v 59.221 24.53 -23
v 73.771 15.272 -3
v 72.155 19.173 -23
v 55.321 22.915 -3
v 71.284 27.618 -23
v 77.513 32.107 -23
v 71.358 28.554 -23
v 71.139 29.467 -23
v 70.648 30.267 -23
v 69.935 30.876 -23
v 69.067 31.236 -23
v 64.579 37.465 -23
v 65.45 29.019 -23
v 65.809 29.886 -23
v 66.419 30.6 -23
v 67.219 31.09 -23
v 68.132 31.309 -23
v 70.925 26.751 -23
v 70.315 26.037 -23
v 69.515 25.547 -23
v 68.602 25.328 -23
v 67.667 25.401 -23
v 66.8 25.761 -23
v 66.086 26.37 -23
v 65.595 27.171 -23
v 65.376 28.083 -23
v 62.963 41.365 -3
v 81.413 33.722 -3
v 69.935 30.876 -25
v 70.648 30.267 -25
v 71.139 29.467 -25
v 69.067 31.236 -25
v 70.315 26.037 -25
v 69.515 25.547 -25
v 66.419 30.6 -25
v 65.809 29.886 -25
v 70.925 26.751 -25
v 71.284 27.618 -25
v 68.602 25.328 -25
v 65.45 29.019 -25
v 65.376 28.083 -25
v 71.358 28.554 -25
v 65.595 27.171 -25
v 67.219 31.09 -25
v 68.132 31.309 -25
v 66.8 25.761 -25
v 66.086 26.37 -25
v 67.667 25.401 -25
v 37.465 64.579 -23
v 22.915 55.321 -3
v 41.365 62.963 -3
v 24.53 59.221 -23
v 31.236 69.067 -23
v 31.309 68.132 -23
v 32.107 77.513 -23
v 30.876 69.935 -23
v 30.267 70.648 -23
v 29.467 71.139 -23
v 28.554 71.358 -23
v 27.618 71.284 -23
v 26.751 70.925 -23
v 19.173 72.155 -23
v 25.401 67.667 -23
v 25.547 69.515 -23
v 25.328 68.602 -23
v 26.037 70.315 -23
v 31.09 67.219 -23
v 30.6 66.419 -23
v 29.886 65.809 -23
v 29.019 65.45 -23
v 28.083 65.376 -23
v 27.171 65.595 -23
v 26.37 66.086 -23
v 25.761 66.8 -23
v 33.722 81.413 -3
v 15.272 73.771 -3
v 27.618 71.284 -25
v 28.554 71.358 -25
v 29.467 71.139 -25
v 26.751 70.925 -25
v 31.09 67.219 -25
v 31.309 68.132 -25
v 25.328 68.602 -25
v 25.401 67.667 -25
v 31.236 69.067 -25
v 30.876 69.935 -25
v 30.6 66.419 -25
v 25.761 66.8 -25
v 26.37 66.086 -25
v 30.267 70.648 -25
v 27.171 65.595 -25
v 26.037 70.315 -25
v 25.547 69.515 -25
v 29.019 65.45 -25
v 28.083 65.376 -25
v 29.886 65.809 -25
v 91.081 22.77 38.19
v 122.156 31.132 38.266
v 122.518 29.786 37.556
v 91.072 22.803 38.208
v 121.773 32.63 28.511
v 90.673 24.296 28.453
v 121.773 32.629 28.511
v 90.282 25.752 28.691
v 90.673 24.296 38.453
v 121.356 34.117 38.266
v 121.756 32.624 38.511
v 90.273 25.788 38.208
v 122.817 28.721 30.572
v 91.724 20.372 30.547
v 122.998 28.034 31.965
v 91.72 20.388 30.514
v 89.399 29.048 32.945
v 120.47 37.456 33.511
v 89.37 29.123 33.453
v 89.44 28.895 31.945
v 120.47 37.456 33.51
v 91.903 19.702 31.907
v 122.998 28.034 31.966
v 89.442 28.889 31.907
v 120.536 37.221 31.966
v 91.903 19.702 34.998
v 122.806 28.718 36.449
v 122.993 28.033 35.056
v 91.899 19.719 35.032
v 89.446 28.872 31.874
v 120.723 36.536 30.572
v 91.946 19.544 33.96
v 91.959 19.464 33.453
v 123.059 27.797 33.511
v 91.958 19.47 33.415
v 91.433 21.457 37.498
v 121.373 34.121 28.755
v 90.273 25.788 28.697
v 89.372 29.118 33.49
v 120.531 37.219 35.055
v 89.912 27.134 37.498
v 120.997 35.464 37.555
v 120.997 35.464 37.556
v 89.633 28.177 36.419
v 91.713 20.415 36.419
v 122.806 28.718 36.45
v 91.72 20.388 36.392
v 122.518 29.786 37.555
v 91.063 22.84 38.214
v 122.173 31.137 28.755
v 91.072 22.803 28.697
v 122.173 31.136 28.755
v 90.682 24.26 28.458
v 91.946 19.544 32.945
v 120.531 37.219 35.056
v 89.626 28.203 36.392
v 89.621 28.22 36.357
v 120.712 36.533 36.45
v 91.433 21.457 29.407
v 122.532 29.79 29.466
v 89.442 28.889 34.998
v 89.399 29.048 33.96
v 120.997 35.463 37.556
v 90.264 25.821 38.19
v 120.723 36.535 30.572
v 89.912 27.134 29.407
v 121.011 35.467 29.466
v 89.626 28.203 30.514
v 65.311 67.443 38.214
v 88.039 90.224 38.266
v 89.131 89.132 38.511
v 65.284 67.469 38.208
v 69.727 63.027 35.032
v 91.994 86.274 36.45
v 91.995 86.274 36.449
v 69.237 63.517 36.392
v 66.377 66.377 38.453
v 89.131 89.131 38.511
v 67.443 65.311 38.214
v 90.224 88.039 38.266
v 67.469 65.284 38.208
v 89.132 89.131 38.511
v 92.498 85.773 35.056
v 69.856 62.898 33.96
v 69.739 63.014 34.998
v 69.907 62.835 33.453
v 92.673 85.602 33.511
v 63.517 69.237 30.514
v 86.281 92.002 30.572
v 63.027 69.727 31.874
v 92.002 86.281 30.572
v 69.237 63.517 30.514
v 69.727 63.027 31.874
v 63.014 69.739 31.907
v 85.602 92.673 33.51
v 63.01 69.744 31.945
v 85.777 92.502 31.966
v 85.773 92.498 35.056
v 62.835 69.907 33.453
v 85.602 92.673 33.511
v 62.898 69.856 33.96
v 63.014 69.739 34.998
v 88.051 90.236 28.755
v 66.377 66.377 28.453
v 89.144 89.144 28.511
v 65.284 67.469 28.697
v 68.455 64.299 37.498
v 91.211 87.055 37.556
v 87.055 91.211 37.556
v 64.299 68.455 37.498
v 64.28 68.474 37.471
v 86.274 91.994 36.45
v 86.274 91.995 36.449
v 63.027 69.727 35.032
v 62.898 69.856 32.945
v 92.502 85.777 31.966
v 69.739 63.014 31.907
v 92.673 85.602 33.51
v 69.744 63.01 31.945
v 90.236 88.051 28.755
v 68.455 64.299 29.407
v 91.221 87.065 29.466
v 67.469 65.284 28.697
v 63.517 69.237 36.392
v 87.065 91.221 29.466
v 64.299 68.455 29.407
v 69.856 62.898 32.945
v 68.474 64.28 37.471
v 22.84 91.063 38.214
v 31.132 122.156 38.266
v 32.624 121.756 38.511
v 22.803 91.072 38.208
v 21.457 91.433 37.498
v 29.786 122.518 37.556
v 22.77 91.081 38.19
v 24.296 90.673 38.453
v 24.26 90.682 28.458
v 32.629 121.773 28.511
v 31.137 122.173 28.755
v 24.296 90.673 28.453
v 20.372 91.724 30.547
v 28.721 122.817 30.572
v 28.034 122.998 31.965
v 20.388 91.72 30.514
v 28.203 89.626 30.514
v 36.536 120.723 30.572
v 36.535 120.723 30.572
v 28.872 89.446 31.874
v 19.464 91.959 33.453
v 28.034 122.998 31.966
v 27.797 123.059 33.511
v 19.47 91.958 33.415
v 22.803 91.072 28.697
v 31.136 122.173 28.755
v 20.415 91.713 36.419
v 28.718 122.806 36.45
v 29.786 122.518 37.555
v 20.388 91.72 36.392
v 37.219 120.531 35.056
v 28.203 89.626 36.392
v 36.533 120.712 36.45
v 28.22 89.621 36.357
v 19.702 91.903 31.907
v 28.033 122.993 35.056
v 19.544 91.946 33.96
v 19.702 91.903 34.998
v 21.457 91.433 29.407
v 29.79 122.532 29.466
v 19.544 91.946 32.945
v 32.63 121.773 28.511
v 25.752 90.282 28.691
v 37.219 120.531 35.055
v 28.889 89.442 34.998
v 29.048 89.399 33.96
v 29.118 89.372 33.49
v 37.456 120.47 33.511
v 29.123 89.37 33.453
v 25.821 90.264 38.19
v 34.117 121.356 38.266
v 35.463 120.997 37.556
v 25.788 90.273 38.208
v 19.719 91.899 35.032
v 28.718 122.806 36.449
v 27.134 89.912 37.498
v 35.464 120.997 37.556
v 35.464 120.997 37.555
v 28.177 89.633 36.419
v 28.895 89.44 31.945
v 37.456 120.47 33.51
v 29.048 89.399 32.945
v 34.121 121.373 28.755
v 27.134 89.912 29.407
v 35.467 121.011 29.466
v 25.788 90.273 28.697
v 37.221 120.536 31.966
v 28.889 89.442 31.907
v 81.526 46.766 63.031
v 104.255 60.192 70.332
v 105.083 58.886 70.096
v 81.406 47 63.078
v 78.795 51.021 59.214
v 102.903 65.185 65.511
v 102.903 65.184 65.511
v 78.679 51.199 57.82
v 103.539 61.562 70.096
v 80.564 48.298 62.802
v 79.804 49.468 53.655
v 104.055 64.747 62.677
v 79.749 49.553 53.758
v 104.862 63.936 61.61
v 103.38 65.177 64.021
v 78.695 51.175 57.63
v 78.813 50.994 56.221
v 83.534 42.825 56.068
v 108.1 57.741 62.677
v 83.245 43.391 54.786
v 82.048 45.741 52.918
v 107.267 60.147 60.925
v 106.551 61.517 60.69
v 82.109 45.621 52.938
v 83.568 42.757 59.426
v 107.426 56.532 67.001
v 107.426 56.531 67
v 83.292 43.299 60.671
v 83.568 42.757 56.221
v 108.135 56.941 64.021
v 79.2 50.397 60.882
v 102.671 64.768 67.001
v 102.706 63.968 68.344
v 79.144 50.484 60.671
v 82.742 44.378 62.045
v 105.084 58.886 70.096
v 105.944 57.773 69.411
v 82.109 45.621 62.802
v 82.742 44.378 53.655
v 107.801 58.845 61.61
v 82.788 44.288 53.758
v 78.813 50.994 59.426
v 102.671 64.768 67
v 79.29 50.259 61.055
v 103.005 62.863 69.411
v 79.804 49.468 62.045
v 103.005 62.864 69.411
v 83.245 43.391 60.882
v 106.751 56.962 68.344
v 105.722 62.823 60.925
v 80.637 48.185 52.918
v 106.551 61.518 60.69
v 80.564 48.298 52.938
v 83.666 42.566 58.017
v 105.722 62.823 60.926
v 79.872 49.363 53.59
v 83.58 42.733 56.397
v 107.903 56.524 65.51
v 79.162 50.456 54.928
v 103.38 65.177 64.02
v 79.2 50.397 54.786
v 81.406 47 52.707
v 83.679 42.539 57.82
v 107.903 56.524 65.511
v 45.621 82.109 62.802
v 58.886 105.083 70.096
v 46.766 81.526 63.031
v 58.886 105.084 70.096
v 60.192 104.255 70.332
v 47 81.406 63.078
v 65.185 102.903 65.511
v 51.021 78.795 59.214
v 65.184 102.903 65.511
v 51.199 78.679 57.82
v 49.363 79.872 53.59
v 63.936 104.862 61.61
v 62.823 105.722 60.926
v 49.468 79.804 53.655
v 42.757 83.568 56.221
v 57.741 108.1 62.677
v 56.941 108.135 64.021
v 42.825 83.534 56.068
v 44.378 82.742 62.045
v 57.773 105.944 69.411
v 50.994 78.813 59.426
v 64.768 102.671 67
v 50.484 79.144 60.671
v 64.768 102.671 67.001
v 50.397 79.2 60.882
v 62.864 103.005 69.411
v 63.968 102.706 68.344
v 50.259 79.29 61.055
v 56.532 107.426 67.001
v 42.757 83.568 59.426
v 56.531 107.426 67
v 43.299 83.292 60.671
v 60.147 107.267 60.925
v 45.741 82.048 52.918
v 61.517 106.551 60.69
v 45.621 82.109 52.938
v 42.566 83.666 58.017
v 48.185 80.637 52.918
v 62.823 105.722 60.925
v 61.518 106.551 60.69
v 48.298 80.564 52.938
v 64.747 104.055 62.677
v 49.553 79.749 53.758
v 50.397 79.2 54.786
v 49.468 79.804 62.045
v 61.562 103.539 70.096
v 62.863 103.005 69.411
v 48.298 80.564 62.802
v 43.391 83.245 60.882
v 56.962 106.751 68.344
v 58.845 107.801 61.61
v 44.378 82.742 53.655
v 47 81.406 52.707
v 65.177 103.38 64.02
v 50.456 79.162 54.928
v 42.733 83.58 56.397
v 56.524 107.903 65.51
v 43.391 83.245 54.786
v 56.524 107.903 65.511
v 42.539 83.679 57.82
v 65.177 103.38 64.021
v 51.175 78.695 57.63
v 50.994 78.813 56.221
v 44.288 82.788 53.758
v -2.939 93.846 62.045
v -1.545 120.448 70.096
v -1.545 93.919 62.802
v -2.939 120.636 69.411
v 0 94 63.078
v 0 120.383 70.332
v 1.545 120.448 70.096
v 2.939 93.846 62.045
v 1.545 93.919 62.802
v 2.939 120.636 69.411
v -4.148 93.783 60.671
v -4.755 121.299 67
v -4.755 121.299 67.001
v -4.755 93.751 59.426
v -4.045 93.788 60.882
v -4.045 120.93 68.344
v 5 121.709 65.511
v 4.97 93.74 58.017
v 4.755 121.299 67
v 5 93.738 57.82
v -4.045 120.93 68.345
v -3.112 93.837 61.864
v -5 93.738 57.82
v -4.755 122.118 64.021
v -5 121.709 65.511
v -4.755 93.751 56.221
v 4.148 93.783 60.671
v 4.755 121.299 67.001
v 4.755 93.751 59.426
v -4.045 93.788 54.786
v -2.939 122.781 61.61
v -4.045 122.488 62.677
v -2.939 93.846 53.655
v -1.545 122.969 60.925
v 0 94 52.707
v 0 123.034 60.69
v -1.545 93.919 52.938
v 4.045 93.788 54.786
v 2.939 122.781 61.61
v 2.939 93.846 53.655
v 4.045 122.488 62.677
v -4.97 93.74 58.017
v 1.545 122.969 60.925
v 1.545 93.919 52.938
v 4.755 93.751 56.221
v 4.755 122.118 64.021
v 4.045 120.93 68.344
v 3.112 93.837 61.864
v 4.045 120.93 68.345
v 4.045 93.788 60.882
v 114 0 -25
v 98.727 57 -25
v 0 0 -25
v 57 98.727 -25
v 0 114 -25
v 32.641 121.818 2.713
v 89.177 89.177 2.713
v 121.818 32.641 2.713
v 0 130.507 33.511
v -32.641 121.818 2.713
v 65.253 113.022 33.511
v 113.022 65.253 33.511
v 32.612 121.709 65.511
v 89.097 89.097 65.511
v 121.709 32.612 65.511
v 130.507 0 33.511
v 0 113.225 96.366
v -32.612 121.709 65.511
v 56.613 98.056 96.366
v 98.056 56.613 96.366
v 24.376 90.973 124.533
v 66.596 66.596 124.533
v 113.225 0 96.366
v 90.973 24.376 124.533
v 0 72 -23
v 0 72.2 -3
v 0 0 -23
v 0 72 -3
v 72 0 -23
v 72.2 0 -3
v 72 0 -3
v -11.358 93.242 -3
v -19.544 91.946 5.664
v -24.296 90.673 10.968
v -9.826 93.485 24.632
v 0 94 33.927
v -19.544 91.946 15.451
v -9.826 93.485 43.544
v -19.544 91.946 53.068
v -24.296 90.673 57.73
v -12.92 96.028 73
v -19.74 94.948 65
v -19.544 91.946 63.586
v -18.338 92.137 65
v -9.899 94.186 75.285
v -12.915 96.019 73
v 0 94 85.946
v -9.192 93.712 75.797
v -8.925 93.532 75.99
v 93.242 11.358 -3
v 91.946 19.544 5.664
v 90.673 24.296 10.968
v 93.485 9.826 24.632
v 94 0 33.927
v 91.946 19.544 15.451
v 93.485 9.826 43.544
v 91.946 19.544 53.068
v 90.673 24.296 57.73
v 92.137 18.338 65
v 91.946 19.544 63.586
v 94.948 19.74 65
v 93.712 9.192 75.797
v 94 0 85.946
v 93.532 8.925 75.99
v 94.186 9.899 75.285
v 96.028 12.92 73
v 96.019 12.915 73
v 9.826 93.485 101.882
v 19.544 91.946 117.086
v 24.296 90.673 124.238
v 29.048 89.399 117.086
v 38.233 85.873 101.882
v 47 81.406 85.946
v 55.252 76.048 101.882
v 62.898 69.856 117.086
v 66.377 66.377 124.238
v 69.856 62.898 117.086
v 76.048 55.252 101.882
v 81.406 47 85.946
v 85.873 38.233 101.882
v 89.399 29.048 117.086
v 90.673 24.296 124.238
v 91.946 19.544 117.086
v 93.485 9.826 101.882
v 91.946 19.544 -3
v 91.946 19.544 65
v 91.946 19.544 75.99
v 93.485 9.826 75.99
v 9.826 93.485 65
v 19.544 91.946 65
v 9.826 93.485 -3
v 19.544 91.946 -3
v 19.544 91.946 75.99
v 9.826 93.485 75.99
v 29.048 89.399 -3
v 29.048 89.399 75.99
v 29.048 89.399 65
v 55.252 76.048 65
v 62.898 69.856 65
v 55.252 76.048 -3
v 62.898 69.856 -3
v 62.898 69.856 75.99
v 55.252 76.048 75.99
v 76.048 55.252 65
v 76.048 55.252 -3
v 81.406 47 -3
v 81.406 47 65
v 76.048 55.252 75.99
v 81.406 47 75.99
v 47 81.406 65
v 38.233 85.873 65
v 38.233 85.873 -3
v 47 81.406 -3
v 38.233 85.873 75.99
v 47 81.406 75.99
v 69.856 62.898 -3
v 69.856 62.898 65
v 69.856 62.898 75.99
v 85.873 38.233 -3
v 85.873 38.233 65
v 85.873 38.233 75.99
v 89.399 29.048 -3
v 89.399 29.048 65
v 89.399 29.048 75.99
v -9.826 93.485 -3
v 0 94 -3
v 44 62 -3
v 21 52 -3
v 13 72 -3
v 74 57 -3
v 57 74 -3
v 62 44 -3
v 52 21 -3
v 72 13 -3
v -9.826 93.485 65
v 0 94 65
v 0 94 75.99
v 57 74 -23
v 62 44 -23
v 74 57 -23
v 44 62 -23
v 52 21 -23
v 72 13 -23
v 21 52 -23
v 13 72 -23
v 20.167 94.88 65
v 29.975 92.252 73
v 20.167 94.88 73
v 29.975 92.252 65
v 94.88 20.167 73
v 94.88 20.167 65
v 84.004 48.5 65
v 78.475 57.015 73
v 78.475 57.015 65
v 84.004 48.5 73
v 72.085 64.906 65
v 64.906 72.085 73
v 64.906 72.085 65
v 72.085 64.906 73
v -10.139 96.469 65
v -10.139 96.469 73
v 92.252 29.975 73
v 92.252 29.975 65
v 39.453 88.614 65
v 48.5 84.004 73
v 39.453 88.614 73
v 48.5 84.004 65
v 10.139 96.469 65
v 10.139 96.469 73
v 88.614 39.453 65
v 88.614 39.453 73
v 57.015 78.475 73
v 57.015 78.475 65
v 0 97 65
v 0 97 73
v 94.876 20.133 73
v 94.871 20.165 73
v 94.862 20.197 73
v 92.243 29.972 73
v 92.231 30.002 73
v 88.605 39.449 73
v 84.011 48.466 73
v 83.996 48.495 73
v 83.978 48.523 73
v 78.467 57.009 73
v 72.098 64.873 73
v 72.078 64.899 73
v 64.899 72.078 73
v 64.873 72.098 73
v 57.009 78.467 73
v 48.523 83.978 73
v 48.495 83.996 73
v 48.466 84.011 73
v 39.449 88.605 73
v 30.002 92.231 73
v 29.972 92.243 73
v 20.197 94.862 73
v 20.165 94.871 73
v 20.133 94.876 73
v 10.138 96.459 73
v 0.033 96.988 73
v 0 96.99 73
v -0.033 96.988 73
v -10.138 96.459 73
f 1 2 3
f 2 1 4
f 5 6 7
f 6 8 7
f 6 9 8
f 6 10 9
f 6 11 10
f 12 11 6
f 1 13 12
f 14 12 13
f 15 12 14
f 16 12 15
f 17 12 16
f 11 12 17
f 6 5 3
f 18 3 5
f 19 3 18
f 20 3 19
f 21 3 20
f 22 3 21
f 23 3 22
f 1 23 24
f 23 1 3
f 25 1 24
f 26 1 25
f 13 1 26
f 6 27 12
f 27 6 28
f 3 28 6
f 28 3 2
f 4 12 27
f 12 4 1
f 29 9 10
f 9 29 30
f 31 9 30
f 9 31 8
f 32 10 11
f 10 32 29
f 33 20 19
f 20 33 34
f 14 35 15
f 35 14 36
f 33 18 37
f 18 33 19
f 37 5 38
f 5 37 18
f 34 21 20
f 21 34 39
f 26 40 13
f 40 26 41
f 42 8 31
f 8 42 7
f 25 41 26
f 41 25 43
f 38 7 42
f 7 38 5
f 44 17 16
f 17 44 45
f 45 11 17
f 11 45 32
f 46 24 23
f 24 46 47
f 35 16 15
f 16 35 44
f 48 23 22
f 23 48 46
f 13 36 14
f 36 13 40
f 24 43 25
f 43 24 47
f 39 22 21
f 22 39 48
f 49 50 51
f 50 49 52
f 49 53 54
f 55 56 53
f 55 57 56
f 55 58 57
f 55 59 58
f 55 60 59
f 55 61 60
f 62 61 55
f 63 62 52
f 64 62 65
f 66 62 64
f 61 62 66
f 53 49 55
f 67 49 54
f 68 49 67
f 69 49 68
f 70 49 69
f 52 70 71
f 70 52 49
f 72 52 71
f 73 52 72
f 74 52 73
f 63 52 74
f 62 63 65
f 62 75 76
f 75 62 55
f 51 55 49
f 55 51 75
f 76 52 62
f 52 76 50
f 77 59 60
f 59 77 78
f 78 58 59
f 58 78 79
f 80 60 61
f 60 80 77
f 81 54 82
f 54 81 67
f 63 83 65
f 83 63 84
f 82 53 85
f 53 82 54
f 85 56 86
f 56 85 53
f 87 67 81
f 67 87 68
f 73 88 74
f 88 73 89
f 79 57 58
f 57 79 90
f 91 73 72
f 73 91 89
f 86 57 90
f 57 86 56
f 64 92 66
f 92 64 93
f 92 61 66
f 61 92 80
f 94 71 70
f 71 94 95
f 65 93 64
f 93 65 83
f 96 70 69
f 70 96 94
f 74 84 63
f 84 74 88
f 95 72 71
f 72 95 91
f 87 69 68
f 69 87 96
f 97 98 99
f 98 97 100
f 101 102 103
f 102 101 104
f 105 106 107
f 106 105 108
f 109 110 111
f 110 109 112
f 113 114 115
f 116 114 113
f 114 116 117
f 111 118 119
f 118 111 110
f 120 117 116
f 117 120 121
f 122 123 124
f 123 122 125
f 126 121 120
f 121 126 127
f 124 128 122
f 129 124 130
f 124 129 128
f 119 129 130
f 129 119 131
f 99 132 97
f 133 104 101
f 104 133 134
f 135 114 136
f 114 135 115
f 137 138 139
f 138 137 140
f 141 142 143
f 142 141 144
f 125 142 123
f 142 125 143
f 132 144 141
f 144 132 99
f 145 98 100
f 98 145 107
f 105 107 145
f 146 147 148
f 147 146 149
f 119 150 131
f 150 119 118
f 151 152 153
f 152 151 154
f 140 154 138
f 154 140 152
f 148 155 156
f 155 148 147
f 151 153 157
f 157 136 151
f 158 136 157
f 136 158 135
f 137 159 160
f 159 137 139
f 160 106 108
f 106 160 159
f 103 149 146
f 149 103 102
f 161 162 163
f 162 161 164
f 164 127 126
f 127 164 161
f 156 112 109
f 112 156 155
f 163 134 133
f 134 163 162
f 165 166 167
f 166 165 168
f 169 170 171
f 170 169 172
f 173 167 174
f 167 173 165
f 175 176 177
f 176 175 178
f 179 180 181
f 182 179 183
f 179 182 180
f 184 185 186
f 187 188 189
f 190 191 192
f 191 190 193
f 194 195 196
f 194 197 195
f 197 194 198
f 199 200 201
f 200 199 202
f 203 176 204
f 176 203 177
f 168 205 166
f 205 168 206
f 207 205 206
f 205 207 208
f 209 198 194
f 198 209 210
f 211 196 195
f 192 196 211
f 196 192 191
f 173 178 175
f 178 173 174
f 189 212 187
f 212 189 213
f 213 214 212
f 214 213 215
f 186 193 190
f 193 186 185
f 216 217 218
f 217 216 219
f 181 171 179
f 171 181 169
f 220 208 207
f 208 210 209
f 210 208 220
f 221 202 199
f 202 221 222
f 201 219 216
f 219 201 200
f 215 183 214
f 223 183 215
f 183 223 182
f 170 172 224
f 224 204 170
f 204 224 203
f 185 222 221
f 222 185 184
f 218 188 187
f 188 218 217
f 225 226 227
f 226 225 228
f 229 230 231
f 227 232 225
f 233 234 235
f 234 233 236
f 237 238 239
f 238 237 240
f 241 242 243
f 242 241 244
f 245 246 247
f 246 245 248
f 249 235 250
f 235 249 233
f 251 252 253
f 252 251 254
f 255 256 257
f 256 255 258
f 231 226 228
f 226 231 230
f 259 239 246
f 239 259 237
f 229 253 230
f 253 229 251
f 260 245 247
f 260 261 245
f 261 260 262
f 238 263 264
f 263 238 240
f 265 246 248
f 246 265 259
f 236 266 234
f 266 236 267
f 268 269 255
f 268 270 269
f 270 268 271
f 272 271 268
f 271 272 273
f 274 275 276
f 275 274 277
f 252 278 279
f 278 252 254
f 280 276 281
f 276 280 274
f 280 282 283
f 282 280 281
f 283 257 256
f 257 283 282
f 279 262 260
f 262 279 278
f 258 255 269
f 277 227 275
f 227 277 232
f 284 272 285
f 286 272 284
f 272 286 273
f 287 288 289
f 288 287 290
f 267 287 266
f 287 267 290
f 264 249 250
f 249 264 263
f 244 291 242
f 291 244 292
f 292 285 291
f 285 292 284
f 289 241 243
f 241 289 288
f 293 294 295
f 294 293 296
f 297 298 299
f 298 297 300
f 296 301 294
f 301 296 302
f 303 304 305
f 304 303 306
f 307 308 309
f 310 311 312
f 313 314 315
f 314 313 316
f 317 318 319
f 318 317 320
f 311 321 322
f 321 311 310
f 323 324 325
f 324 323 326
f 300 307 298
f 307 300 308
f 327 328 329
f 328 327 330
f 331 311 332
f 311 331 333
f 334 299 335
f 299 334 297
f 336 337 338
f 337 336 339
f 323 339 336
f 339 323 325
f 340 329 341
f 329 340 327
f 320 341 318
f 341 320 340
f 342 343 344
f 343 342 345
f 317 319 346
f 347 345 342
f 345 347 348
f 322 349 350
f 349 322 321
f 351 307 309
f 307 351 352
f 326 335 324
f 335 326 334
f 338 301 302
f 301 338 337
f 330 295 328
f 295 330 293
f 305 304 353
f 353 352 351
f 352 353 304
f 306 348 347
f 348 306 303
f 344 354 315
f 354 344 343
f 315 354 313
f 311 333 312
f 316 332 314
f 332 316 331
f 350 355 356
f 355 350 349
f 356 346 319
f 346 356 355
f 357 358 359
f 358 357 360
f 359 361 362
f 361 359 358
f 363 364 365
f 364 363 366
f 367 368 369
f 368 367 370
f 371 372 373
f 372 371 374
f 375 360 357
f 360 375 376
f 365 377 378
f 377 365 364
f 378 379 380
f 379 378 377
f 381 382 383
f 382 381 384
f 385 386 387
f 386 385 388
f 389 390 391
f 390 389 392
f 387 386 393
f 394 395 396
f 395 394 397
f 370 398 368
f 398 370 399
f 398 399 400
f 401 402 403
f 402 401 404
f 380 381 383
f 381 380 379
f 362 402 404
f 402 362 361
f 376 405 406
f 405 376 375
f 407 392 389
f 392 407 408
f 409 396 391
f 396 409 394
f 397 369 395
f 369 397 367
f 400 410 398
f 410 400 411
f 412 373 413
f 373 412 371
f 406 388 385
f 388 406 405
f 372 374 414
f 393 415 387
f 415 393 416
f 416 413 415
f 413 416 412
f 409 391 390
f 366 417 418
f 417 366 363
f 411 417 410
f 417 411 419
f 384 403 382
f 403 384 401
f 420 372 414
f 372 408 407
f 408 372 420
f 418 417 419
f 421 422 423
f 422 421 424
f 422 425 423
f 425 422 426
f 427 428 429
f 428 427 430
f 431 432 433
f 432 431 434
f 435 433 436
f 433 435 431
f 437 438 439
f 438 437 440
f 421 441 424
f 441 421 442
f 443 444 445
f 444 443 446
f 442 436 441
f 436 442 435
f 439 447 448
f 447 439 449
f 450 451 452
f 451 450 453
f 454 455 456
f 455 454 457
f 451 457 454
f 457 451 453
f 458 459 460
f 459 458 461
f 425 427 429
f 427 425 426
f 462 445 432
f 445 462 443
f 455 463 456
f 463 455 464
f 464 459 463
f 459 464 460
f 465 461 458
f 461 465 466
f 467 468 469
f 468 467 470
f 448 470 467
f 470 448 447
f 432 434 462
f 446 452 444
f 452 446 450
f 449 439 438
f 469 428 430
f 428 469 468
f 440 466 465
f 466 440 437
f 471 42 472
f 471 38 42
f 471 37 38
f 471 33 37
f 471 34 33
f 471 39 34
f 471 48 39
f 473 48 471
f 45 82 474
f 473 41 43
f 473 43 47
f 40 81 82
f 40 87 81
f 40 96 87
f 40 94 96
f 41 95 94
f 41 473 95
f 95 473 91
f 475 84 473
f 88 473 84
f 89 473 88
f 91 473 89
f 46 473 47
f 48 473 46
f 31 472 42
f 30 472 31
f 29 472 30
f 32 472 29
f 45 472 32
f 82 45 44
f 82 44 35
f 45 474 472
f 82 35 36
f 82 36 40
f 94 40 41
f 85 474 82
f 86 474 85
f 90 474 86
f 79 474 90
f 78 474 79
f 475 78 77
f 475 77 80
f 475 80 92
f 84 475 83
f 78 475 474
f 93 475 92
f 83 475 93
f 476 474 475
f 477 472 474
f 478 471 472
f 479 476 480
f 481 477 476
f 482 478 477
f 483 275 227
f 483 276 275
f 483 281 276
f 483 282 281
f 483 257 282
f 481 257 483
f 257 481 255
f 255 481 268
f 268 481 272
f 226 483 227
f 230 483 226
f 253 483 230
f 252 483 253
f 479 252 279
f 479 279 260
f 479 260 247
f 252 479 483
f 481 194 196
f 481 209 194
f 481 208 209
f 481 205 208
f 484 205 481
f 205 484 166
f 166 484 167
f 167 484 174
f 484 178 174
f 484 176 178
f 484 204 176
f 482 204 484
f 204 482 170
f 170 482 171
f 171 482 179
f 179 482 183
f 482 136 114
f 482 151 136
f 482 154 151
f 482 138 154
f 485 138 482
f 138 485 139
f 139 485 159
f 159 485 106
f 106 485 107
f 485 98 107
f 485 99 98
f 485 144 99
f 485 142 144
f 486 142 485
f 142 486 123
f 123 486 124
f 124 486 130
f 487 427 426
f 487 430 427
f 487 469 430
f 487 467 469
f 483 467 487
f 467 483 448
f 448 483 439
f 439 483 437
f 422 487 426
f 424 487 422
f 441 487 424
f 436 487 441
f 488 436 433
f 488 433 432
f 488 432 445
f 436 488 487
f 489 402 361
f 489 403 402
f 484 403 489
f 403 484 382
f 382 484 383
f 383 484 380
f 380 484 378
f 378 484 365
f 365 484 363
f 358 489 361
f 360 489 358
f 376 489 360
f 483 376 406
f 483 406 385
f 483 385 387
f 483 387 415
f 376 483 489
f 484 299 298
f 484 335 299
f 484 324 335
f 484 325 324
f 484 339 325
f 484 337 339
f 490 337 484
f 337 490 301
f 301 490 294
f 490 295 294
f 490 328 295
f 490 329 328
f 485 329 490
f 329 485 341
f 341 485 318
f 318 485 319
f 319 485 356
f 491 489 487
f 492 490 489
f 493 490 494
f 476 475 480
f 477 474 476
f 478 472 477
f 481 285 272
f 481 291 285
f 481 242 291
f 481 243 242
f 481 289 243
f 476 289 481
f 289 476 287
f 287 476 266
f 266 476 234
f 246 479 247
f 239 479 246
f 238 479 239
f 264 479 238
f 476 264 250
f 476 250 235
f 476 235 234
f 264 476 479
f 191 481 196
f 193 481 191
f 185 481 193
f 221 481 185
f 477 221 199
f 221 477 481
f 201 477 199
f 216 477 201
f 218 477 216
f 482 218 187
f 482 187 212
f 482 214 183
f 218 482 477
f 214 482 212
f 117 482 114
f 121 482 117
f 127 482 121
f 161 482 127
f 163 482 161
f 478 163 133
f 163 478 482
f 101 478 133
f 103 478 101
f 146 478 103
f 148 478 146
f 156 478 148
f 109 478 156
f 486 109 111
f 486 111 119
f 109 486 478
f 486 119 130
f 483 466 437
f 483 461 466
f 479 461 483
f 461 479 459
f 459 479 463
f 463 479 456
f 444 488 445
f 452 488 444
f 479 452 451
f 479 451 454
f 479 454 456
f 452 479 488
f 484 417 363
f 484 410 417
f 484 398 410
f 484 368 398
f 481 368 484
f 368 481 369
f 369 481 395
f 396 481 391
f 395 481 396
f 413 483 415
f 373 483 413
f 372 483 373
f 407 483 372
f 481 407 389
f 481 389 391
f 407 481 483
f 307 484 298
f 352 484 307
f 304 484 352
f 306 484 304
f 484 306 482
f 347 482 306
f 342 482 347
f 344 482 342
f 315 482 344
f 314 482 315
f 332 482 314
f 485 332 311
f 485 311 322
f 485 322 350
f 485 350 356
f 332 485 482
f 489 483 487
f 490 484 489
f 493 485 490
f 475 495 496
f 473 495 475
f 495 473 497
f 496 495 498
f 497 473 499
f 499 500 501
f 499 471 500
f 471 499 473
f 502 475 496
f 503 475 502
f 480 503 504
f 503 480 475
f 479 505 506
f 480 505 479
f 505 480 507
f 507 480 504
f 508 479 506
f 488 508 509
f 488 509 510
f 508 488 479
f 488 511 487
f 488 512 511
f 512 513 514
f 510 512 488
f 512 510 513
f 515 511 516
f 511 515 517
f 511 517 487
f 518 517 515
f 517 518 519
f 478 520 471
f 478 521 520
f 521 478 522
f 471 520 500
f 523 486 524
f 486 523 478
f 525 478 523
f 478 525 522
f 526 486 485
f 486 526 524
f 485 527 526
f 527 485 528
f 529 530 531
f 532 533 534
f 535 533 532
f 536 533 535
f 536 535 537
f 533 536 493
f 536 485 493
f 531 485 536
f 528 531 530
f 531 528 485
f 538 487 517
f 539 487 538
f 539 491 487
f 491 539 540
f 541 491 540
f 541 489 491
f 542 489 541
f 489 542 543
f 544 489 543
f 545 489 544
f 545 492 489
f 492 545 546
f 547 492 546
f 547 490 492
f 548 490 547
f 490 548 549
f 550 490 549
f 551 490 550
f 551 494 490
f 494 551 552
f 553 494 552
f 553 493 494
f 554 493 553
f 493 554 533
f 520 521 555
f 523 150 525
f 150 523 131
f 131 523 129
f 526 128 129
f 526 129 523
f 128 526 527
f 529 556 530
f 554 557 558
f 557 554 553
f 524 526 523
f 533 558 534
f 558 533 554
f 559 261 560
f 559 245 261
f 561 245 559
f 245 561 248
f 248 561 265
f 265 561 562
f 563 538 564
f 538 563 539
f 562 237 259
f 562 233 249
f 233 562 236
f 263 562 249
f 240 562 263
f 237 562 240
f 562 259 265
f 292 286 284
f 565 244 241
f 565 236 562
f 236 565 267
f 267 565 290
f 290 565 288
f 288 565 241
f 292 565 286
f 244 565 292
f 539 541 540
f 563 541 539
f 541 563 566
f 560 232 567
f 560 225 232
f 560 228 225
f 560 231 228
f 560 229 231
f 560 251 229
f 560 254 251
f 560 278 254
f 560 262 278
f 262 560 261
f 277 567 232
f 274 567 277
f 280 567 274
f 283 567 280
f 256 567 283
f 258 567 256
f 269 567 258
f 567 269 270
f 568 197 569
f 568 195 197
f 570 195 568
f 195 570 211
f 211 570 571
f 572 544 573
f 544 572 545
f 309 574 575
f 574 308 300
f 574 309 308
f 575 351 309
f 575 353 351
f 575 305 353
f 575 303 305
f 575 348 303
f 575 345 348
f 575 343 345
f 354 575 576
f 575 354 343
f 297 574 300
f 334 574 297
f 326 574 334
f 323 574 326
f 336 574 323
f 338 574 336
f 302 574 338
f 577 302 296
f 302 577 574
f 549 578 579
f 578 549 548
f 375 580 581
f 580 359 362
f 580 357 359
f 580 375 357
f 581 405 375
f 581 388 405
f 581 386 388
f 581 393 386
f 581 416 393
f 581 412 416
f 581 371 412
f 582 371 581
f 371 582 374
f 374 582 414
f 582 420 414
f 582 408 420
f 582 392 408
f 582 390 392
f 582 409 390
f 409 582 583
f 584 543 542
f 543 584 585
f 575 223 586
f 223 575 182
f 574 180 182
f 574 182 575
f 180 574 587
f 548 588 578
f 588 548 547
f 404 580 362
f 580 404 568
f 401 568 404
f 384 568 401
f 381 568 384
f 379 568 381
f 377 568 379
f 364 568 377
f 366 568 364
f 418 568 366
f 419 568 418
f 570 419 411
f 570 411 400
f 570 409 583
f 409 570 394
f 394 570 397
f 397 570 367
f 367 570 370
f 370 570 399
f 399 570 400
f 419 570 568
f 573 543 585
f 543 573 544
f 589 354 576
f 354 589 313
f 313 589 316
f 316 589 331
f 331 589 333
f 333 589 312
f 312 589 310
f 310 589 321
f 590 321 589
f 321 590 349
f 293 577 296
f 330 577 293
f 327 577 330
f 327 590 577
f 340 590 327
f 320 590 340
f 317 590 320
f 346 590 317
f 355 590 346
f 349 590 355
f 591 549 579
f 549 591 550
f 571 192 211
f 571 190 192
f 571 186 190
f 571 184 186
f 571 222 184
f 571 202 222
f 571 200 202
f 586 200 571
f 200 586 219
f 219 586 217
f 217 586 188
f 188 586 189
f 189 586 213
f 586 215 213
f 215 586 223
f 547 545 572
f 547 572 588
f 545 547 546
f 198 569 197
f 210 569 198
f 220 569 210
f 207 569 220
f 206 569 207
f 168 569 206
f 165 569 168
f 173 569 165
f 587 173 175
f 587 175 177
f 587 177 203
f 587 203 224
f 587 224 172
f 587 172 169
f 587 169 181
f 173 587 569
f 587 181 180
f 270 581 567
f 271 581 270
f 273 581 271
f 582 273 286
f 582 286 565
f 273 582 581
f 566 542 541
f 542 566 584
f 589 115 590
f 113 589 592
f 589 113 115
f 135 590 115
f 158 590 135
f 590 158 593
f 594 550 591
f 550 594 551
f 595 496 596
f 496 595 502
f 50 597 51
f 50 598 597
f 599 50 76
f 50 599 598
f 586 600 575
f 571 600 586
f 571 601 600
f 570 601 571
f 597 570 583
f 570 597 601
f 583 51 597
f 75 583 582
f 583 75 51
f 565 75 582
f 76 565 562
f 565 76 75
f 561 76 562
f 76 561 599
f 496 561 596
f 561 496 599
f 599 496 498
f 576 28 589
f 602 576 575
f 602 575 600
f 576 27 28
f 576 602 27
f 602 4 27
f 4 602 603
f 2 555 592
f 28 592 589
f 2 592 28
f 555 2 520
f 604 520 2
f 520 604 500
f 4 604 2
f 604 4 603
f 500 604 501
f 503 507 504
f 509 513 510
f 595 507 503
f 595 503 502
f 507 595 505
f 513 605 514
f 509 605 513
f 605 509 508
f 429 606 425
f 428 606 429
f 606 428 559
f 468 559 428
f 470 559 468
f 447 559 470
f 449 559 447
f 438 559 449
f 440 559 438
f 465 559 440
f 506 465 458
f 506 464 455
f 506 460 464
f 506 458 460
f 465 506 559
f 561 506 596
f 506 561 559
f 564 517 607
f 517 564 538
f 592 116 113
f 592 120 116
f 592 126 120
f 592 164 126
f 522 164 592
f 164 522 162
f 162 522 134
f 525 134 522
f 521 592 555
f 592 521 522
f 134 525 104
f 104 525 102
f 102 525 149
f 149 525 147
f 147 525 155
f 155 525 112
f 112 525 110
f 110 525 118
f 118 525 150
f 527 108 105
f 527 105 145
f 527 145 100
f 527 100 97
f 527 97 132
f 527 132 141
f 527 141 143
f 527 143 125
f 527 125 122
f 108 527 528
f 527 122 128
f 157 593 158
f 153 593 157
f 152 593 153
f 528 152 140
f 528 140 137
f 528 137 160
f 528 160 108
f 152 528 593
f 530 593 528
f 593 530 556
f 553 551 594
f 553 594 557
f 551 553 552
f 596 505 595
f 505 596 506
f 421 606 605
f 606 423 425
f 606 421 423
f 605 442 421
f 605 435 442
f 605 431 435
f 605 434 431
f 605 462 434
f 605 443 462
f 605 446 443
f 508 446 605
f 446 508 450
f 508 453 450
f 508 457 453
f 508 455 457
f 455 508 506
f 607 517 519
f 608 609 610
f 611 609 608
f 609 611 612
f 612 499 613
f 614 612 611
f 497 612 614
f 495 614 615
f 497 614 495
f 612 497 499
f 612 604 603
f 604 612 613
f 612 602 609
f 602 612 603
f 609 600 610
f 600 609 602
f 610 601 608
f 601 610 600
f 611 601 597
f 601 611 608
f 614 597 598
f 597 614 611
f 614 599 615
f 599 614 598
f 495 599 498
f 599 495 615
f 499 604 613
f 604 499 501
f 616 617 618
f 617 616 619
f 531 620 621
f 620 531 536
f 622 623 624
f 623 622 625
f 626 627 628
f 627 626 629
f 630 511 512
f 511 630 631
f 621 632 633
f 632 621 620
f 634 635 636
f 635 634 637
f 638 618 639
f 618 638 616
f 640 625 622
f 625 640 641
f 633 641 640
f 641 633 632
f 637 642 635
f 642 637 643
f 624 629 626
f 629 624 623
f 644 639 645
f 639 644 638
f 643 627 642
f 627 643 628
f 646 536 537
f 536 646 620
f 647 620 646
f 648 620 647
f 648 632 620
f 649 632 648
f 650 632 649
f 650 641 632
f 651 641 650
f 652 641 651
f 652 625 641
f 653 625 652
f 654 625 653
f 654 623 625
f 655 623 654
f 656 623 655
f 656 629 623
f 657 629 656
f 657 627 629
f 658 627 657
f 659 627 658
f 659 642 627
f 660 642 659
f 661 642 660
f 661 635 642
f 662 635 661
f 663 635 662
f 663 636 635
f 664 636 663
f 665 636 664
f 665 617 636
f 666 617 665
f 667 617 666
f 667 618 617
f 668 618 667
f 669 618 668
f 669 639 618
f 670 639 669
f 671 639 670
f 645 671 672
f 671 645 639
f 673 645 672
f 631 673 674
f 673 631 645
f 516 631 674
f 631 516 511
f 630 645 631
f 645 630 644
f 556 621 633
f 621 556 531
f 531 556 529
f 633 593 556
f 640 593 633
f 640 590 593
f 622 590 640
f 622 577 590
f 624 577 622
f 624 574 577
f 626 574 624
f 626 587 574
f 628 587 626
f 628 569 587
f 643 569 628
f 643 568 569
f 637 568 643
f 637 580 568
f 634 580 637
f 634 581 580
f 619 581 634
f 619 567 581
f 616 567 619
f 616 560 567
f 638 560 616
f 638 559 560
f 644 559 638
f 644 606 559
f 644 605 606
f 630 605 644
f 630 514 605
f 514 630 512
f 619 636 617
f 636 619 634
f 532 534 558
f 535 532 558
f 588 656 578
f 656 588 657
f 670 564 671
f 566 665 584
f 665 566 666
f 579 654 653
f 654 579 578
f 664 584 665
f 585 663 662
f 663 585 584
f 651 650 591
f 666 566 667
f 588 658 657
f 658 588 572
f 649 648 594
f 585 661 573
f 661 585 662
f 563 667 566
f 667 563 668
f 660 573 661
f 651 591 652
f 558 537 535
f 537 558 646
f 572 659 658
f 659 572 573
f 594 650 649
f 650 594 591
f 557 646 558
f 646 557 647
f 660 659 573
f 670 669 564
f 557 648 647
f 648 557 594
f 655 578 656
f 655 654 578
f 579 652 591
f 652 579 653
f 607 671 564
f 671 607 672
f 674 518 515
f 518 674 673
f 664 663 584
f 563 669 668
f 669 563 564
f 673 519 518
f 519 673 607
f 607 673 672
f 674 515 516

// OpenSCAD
doitem = "";

outer_dia = 188;
def_cp = 60;

choff = 1.5;
hmof = 10.4;
holeof = 2.2;

baseholes = [39,42,81,99];
capholes = [33,44,86,87];
cappins = [10,19,78,95];

humidang = 20;

postthi = 3;
prad = 16;
jackout = 2;
jackhi = 25;

if (doitem == "inner_base") { inner_base(cp=240); } 
if (doitem == "inner_cap") { rotate([180,0,45]) inner_cap(cp=240); } 
if (doitem == "inner_post") { inner_post(cp=240); } 
if (doitem == "outer_base") { outer_base(cp=240); } 
if (doitem == "") {
    //translate([-15,-1,300]) rotate([70,0,0]) rotate([0,90,0]) brainL();
    *color("#c46") translate([0,0,160]) rotate([0,90,0]) rotate([0,0,-15]) brainL();
    *color("#c46") translate([0,0,160]) rotate([0,-90,0]) rotate([0,0,15]) brainR();

    *color("#86c") inner_post(cp=60);

    *color("#68c") inner_base(cp=60, solid=true);
    *color("#97c") inner_cap(cp=60);
    *translate([0,0,0])  {
        color("#68c") render(convexity=10) inner_base(cp=60);
        color("#86c") render(convexity=10) inner_cap(cp=60);
        rotate([0,0,90]) {
            color("#68c2") render(convexity=10) inner_base(cp=60);
            color("#86c2") render(convexity=10) inner_cap(cp=60);
        }
        rotate([0,0,180]) {
            color("#68c") render(convexity=10) inner_base(cp=60);
            color("#86c") render(convexity=10) inner_cap(cp=60);
        }
        rotate([0,0,270]) {
            color("#68c2") render(convexity=10) inner_base(cp=60);
            color("#86c2") render(convexity=10) inner_cap(cp=60);
        }
    }

    *color("#cc53") jackplugs();
    *color("#ccc5") render(convexity=5) glassjar();

    *color("#789") render(convexity=10) outer_base();
    *color("#4a93") rotate([0,0,90]) render(convexity=10) outer_base();
    *color("#47c3") rotate([0,0,180]) render(convexity=10) outer_base();
    *color("#4a93") rotate([0,0,270]) render(convexity=10) outer_base();

    color("#789") outer_base();
    *color("#789") outer_base_section();


    *color("#5954") translate([00,00,-26.2]) cube([250,200,2],true);
}

module outer_base(cp=def_cp)
{
    thick = 20;
    numedg = 12;
    stp = 32;
    bot = 25;
    bthi = 3;
    parts = 4;

    irad = outer_dia/2;
    orad = irad+thick;

    difference() {
        circles = generate_facet_circles(numedg, stp, orad, -bot, 30, 6);
        ci = numedg*(len(circles)-2);
        cc = numedg*len(circles);

        // Points spiral because of the way it's setup.
        // Therefore some complicated trickery is needed to get the partial side
        polyhedron(convexity=10
            , points = concat([for (circ=circles) each circX(circ[0], circ[1], circ[3], numedg) ],
                [[0, 0, 35], [0,0,-bot]])
            , faces = concat(
                [concat(cc+1, [for (an=[numedg/parts-circles[0][3]:-1:-circles[0][3]]) an])],
                [for (l=[0:len(circles)-2], an=[-circles[l][3]:numedg/parts-circles[l][3]-1])
                    [l*numedg+an,l*numedg+an+1,(l+1)*numedg+an]],
                [for (l=[0:len(circles)-3], an=[-circles[l+1][3]+1:numedg/parts-circles[l+1][3]])
                    [l*numedg+an,(l+1)*numedg+an,(l+1)*numedg+an-1]],
                [[-circles[0][3], cc, cc+1], [numedg/parts-circles[0][3], cc+1, cc]],
                [for (l=[0:len(circles)-3])
                    [l*numedg-circles[l][3], (l+1)*numedg-circles[l+1][3], cc]],
                [for (l=[0:len(circles)-3])
                    [numedg/parts+(l+1)*numedg-circles[l+1][3], numedg/parts+l*numedg-circles[l][3], cc]],
                [for (l=[-circles[len(circles)-2][3]:numedg/parts-circles[len(circles)-2][3]-1]) each [
                     [ci+l, ci+(l+1)%numedg, ci+l+numedg],
                     [ci+l, ci+l+numedg, cc],
                     [ci+(l+1)%numedg, cc, ci+l+numedg]
                     ]]
            )
        );
        // Jar cutout
        translate([0,0,-bthi]) cylinder(circles[len(circles)-1][0]+0.01+bthi, irad, irad, $fn=cp);
        // *translate([0,0,-bot+2]) cylinder(bot-bthi-1.9, irad-20, irad-20, $fn=8);
        // Bottom cutout
        translate([0,0,-bot+2]) linear_extrude(height=bot-bthi-1.9, convexity=10) polygon([
            [-0.1,-0.1],
            [irad-22,-0.1], [irad-22, 13], [irad-42, 21],
            [irad-32, 44], [irad-20,57],
            [57, irad-20], [44, irad-32],
            [21, irad-42], [13, irad-22], [-0.1, irad-22],
        ]);
        // Feet holes
        for (an=[22.5,67.5]) {
            rotate([0,0,an]) translate([irad-20,0,0]) rotate([0,0,0]) {
                // *rotate([0,0,45]) translate([-10,-10,-bot+2]) cube([20,20, bot-bthi-1.9]);
                // *translate([-5,-5,-bot-0.1]) cube([10,10, 2.2]);
                translate([0,0,-bot+2]) cylinder(bot-bthi-1.9, 7*sqrt(2), 10*sqrt(2), $fn=4);
                translate([0,0,-bot-0.1]) cylinder(2.2, 3, 3, $fn=cp/3);
            }
        }
        // Facet holes.
        // Todo: actually make them fit whatever comes in them (leds, connectors, switches)
        for (c=[2,3]) {
            circ = circles[c];
            for (an=[(circ[3]-floor(circ[3]))*(360/numedg):360/numedg:(numedg/parts+(circ[3]-floor(circ[3])-1))*(360/numedg)]) {
                rotate ([0,0,an+(360/numedg/2)]) {
                    translate([circ[1]*cos(360/numedg/2), 0, circ[0]]) rotate([0,270+circ[2],0])
                        translate([0,0,-0.01]) cylinder(33,5,5,$fn=cp/3);
                }
            }
        }
        // Ledstrip slot (strip is 8x2mm)
        translate([0,0,65]) cylinder(8, irad+3, irad+3, $fn=cp);
        translate([0,0,72.99]) cylinder(3, irad+3, irad, $fn=cp);
    }
}

module inner_post(cp=def_cp)
{
    jthi = 20;
    irad = outer_dia/2 - jthi;
    crad = 35.6;
    bhei = 50;
    hei = 150;

    brad = crad/sqrt(2);
    bext = irad-brad;
    difference() {
        union() {
            /*
            // Post
            cylinder(hei, prad, prad, $fn=cp);
            // Inside base
            cylinder(bhei, crad, crad, $fn=cp);
            // Bottom flange
            rotate([0,0,45]) linear_extrude(height=postthi) polygon(concat(
                [for (an=[-15:360/cp:180+15]) [sin(an)*brad+bext, cos(an)*brad]],
                [[0,-6]],
                [for (an=[180-15:360/cp:360+15]) [sin(an)*brad-bext, cos(an)*brad]],
                [[0, 6]]
            ));
            */
            translate([0,0,2]) {
                // Post
                cylinder(hei-2, prad, prad, $fn=cp);
                // Inside base
                cylinder(bhei-4.5, crad, crad, $fn=cp);
            }
            // Outsets for connectors
            if (jackout > 0) {
                for (an=[0:3]) rotate([0,0,an*90]) {
                    *translate([prad-2, 0, bhei+jackhi]) rotate([0,90,0])
                        cylinder(jackout+1.5, 7, 4, $fn=cp/3);
                    translate([prad-2, 0, bhei+jackhi]) polyhedron(convexity=10,
                        points=concat(
                            [for (an=[-90:360/cp: 90]) [0, sin(an)*6, cos(an)*6]],
                            [for (an=[ 90:360/cp:270]) [0, sin(an)*6, cos(an)*6-8]],
                            [for (an=[-90:360/cp: 90]) [jackout+1.5, sin(an)*4, cos(an)*4]],
                            [for (an=[ 90:360/cp:270]) [jackout+1.5, sin(an)*4, cos(an)*4-6]]
                        ), faces = concat(
                            nbot(0, cp+2),
                            nquad(0, cp+2),
                            ntop(1, cp+2)
                        )
                    );
                }
            }
        }
        corad = crad-3;
        cirad = prad;
        // Cutout base
        translate([0,0,3]) for (xa=[90:90:360]) {
            linear_extrude(height=bhei-2.9, convexity=10) polygon(concat(
                [for (an=[ 3: 360/cp:90-3]) [sin(an+xa)*corad, cos(an+xa)*corad]],
                [for (an=[90-3:-360/cp: 3]) [sin(an+xa)*cirad, cos(an+xa)*cirad]]
            ));
        }
        // Cutout middle
        translate([0,0,-0.1]) cylinder(hei+0.2, prad-2, prad-2, $fn=cp);

        // Slits and connector holes for humidifier discs
        for (an=[0:3]) rotate([0,0,an*90]) {
            rotate([0,0,45]) translate([prad-3.5,-2.5,bhei-15]) cube([3.6, 5, 25]);
            translate([prad+jackout,0,bhei+jackhi]) {
                translate([-3.5,0,0]) rotate([0,90,0]) cylinder(3.6, 3, 3, $fn=cp/3);
                if (jackout < 1) {
                    translate([-0.5,0,0]) rotate([0,90,0]) cylinder(1.0,4.5,4.5, $fn=cp/3);
                }
                translate([-2.0,0,0]) rotate([0,-90,0]) cylinder(5.0,4.5,4.5, $fn=cp/3);
                translate([-2.0-4,-3,-8]) cube([4, 6, 8]);
            }
        }

        // Drainage holes
        translate([0,0,2]) for (an=[90:90:360]) {
            rotate([0,90,an+3]) {
                translate([-3,3,prad-5]) cylinder(crad-prad+12, 3, 3, $fn=4);
                translate([0,3,prad-5])
                    rotate([0,0,45]) cylinder(crad-prad+12, 3*sqrt(2), 3*sqrt(2), $fn=4);
            }
            rotate([0,90,an-3]) {
                translate([-3,-3,prad-5]) cylinder(crad-prad+12, 3, 3, $fn=4);
                translate([0,-3,prad-5])
                    rotate([0,0,45]) cylinder(crad-prad+12, 3*sqrt(2), 3*sqrt(2), $fn=4);
            }
        }
    }
}

module jackplugs()
{
    bhei = 50;
    for (an=[0:3]) rotate([0,0,an*90]) translate([0,0,bhei+jackhi]) {
        translate([prad+1.5+jackout,0,0]) rotate([0,-90,0]) cylinder(15, 1.75, 1.75, $fn=30);
        render(convexity=10) translate([prad+1.5+jackout,0,0]) rotate([0,-90,0]) {
            cylinder(7.5, 2.9, 2.9, $fn=30);
            translate([0,0,0.6]) cylinder(1.4, 4, 4, $fn=30);
            translate([0,0,3.6]) cylinder(3.9, 4.5, 4.5, $fn=30);
            translate([-7,-3,3.8]) cube([7, 6, 12.7]);
        }
    }
}

module inner_base(cp=def_cp, solid=false)
{
    jthi = 10;
    irad = outer_dia/2 - jthi;
    crad = 36;
    hei = 50;
    wad = 47.5;

    hst = 5.8;

    drhei = 2;

    holes = [for (d=[crad+hst-holeof: hst: irad-hst/2])
        let(nstp = floor(d/(hst/1.5)),
            stp = (90-choff)/nstp,
            vst = d*3.141/nstp/2,
            by = hst*0.5-0.25,
            bx1 = vst*0.5-0.5,
            bx2 = vst*0.5-0.1)
        for (an=[stp/2+choff/2:stp:90-stp/2])
            [d, an, by, bx1, bx2]
    ];
    difference() {
        union() {
            linear_extrude(height=hei, convexity=20) difference() {
                // Quarter circle block
                polygon(concat(
                    [for (an=[0:360/cp:90]) [sin(an)*irad, cos(an)*irad]],
                    [for (an=[90:-360/cp:0]) [sin(an)*crad, cos(an)*crad]]
                ));
                if (!solid) {
                    // Square holes in block
                    for (hole=holes) {
                        d = hole[0];
                        an = hole[1];
                        by = hole[2];
                        bx1 = hole[3];
                        bx2 = hole[4];
                        rotate([0,0,an]) translate([d,0,0]) polygon([
                            [-by, -bx1], [ by, -bx2],
                            [ by,  bx2], [-by,  bx1]
                        ]);
                    }
                }
            }
            if (!solid) {
            // Upper block for humidifier element
            intersection() {
                rotate([0,0,humidang]) translate([(irad+crad)/2+hmof, 0, hei]) rotate([45,0,4]) {
                    translate([-12,-11,-14]) cube([26,22,3]);
                }
                linear_extrude(height=hei, convexity=20)
                    polygon(concat(
                        [for (an=[0:360/cp:90]) [sin(an)*(irad-0.1), cos(an)*(irad-0.1)]],
                        [for (an=[90:-360/cp:0]) [sin(an)*(crad+hst*4.5-holeof), cos(an)*(crad+hst*4.5-holeof)]]
                    ));
            }
            // Lower block for cotton wad
            intersection() {
                rotate([0,0,humidang]) translate([(irad+crad)/2+hmof, 0, hei]) rotate([45,0,4]) {
                    translate([-13,-5,-14-wad]) cube([21, 10, 4]);
                }
                linear_extrude(height=hei, convexity=20)
                    polygon(concat(
                        [for (an=[0:360/cp:90]) [sin(an)*(irad-0.1), cos(an)*(irad-0.1)]],
                        [for (an=[90:-360/cp:0]) [sin(an)*(crad+hst*6.5-holeof), cos(an)*(crad+hst*6.5-holeof)]]
                    ));

            }
            // Screw hole inserts
            for (h=baseholes) {
                cwid = 5.8;
                chei = 6.5;
                d = holes[h][0];
                an = holes[h][1];
                rotate([0,0,an]) translate([d,0,hei-12]) difference() {
                    translate([-cwid/2,-chei/2,0]) cube([cwid,chei,12]);
                    translate([0,0,-0.01]) cylinder(12.02, 1.3, 1.3, $fn=cp/6);
                    translate([0,0,-0.01]) rotate([0,0,45]) cylinder(4, chei/sqrt(2)+0.1, 1.2, $fn=4);
                }
            }
            }
            // Extra edge for under center post
            linear_extrude(height=2, convexity=20) {
                polygon(concat(
                    [for (an=[15:360/cp:75]) [sin(an)*(crad+1), cos(an)*(crad+1)]],
                    [for (an=[72,18]) [sin(an)*(crad-7), cos(an)*(crad-7)]]
                ));

            }
        }
        // Cutouts for humidifier element
        rotate([0,0,humidang]) translate([(irad+crad)/2+hmof, 0, hei]) rotate([45,0,4]) {
            translate([0,0,-12]) cylinder(22, 10, 10, $fn=cp);
            translate([0,0,-11]) multmatrix(m = [
                [1, 0, 0, 0],
                [0, 1, 1, 0],
                [0, 0, 1, 0],
                [0, 0, 0, 1]
            ]) cylinder(22, 10, 10, $fn=cp);
            translate([0,0,-12-wad]) cylinder(wad + 0.1, 4, 4, $fn=cp);
        }
        if (!solid) {
        // Holes at bottom for water flow
        for (d=[crad+hst-2.2: hst: irad-hst/2]) {
            nstp = floor(d/(hst/1.5));
            stp = (90-choff)/nstp;
            for (an=[stp/2+(choff/2)-stp/2:stp:90]) {
                rotate([0,0,an]) translate([d,0,drhei]) rotate([90,0,0])
                    translate([0, 0, -hst*0.2]) cylinder(hst*0.4, 1, 1, $fn=4);
            }
        }
        rotate([0,0,0]) translate([crad-1,hst/2+0.5,drhei]) rotate([0,90,0])
            cylinder(irad-crad-2, 1, 1, $fn=4);
        rotate([0,0,90]) translate([crad-1,-hst/2-0.5,drhei]) rotate([0,90,0])
            cylinder(irad-crad-2, 1, 1, $fn=4);

        }
        // Cutout for humidifier cable
        rotate([0,0,29]) translate([crad-1,0,hei]) rotate([0,90,0]) {
            rotate([0,0,30]) cylinder(irad-crad-17.5, 3, 3, $fn=6);
        }
    }
}

module inner_cap(cp=def_cp)
{
    bhei = 50;
    jthi = 10;
    irad = outer_dia/2 - jthi;
    crad = 36;
    hei = 2;
    wad = 50;

    hst = 5.8;

    caphi = 22-3;

    holes = [for (d=[crad+hst-holeof: hst: irad-hst/2])
        let(nstp = floor(d/(hst/1.5)),
            stp = (90-choff)/nstp,
            vst = d*3.141/nstp/2,
            fstp = floor(nstp/2),
            by = hst*0.5-0.25,
            bx1 = vst*0.5-0.5,
            bx2 = vst*0.5-0.1)
        for (an=[stp/2-choff/2-fstp*stp:stp:45-stp/2])
            [d, an+(an > 0 ? choff : 0), by, bx1, bx2]
    ];

    translate([0,0,50.1]) difference() {
        union() {
            difference() {
                // Quarter circle plate
                union() {
                    linear_extrude(height=hei, convexity=20) {
                        polygon(concat(
                            [for (an=[45:360/cp:135]) [sin(an)*irad, cos(an)*irad]],
                            [for (an=[135:-360/cp:45]) [sin(an)*(crad-1), cos(an)*(crad-1)]]
                        ));
                    }
                    // Edge to hold center post in place
                    translate([0,0,-2.5]) linear_extrude(height=hei+2.5, convexity=20) {
                        polygon(concat(
                            [for (an=[45:360/cp:135]) [sin(an)*(crad-0.2), cos(an)*(crad-0.2)]],
                            [for (an=[135:-360/cp:45]) [sin(an)*(crad-3), cos(an)*(crad-3)]]
                        ));
                    }
                }
                // Water holes
                for (h=[0:len(holes)-1]) {
                    if (len(search(h, capholes)) == 0) {
                        d = holes[h][0];
                        an = holes[h][1];
                        rotate([0,0,an]) translate([d,0,-0.01]) cylinder(hei+0.02, 1, 2.9, $fn=cp/6);
                    }
                }
            }
            // Extrusion to hold humidifier
            translate([0,0,-hei]) intersection() {
                rotate([0,0,humidang]) translate([(irad+crad)/2+hmof, 0, hei]) rotate([45,0,4]) {
                    translate([0,0,-caphi+10]) cylinder(caphi+10, 10, 10, $fn=cp);
                }
                translate([50,1,2*hei-30]) cube([50, 50, 30]);
            }
            // Extrusions that fit in base holes
            for (h=cappins) {
                d = holes[h][0];
                an = holes[h][1];
                by = holes[h][2]-0.2;
                bx1 = holes[h][3]-0.2;
                bx2 = holes[h][4]-0.2;
                iy = by-0.5;
                ix1 = bx1-0.5;
                ix2 = bx2-0.5;
                rotate([0,0,an]) translate([d,0,-5])
                    linear_extrude(height=5, convexity=10) polygon(
                    points=[ 
                        [-by, -bx1], [ by, -bx2],
                        [ by,  bx2], [-by,  bx1],
                        [-iy, -ix1], [ iy, -ix2],
                        [ iy,  ix2], [-iy,  ix1],
                    ],
                    paths=[[0,1,2,3],[4,5,6,7]]
                );
            }
        }
        // Screw holes
        for (h=capholes) {
            d = holes[h][0];
            an = holes[h][1];
            rotate([0,0,an]) translate([d,0,-0.01]) cylinder(hei+0.02, 1.6, 1.6, $fn=cp/6);
        }
        // Hole for humidifier
        rotate([0,0,humidang]) translate([(irad+crad)/2+hmof, 0, 0]) rotate([45,0,4]) {
            translate([0,0,-caphi+9.9]) cylinder(caphi+0.1, 7, 7, $fn=cp);
            translate([0,0,-22+10]) cylinder(4, 10.01, 10.01, $fn=cp);
            translate([0,-5,-8]) rotate([90,0,0]) cylinder(5, 4, 4, $fn=cp);
        }
        // Hole for humidifier cable
        rotate([0,0,29]) translate([crad-4,0,hei-5]) rotate([0,90,0]) {
            rotate([0,0,30]) cylinder(5, 3, 3, $fn=6);
        }
    }
}

module humid_disc(cp=def_cp)
{
    cylinder(3, 20, 20, $fn=cp);

}

module brain()
{
    render(convexity=5) scale(4.95) import("brain.stl");
}

module brainL()
{
    translate([-110, -150, 0]) import("brain A.stl", convexity=5);
}

module brainR()
{
    rotate([0,0,180]) translate([-224, -200, 0]) import("brain B.stl", convexity=5);
}

module glassjar()
{
    orad = outer_dia/2-1;
    thi = 2;
    trad = 136/2+thi;
    top = 290;
    neck = 220;
    
    nbev = (orad-trad);
    
    points = concat(
            circX(0, orad),
            circX(neck, orad),
            circX(neck+nbev, trad),
            circX(top, trad),
            circX(top, trad-thi),
            circX(neck+nbev, trad-thi),
            circX(neck, orad-thi),
            circX(thi, orad-thi)
        );
    //echo(points);
    faces = concat(
        nbot(0),
        [for (l=[0:6]) each nquad(l)],
        ntop(7),
        []
    );
    //echo(faces);
    polyhedron(convexity=5,
        points = points,
        faces = faces
    );
}


// Generate diamond facets going up and inward from a cerrain radius
function generate_facet_circles(numedg, stp, rad, hei, an, num) = (num <= 0) ? [] : let(
    rad1 = cos(360/numedg/2)*rad+stp*sin(an),
    hei1 = hei + stp*cos(an),
    an1 = atan((cos(360/numedg/2)*rad1-rad) / (hei1-hei))
) concat(
    [[hei, rad, an, -num/2]],
    generate_facet_circles(numedg, stp, rad1, hei1, an1, num-1)
);

function circX(z, d, of=0, cp=def_cp) = [for (an=[of*(360/cp):360/cp:(cp+of-1)*(360/cp)])
    [sin(an)*d, cos(an)*d, z]
];

function nquad(l, cp=def_cp) = [for (an=[0:cp-1]) each [
    [l*cp + an, l*cp + (an+1)%cp, (l+1)*cp + an],
    [(l+1)*cp + an, l*cp + (an+1)%cp, (l+1)*cp + (an+1)%cp]
]];

function ntop(l,cp=def_cp) = [[for (an=[0:cp-1]) l*cp+an]];
    
function nbot(l,cp=def_cp) = [[for (an=[cp-1:-1:0]) l*cp+an]];
